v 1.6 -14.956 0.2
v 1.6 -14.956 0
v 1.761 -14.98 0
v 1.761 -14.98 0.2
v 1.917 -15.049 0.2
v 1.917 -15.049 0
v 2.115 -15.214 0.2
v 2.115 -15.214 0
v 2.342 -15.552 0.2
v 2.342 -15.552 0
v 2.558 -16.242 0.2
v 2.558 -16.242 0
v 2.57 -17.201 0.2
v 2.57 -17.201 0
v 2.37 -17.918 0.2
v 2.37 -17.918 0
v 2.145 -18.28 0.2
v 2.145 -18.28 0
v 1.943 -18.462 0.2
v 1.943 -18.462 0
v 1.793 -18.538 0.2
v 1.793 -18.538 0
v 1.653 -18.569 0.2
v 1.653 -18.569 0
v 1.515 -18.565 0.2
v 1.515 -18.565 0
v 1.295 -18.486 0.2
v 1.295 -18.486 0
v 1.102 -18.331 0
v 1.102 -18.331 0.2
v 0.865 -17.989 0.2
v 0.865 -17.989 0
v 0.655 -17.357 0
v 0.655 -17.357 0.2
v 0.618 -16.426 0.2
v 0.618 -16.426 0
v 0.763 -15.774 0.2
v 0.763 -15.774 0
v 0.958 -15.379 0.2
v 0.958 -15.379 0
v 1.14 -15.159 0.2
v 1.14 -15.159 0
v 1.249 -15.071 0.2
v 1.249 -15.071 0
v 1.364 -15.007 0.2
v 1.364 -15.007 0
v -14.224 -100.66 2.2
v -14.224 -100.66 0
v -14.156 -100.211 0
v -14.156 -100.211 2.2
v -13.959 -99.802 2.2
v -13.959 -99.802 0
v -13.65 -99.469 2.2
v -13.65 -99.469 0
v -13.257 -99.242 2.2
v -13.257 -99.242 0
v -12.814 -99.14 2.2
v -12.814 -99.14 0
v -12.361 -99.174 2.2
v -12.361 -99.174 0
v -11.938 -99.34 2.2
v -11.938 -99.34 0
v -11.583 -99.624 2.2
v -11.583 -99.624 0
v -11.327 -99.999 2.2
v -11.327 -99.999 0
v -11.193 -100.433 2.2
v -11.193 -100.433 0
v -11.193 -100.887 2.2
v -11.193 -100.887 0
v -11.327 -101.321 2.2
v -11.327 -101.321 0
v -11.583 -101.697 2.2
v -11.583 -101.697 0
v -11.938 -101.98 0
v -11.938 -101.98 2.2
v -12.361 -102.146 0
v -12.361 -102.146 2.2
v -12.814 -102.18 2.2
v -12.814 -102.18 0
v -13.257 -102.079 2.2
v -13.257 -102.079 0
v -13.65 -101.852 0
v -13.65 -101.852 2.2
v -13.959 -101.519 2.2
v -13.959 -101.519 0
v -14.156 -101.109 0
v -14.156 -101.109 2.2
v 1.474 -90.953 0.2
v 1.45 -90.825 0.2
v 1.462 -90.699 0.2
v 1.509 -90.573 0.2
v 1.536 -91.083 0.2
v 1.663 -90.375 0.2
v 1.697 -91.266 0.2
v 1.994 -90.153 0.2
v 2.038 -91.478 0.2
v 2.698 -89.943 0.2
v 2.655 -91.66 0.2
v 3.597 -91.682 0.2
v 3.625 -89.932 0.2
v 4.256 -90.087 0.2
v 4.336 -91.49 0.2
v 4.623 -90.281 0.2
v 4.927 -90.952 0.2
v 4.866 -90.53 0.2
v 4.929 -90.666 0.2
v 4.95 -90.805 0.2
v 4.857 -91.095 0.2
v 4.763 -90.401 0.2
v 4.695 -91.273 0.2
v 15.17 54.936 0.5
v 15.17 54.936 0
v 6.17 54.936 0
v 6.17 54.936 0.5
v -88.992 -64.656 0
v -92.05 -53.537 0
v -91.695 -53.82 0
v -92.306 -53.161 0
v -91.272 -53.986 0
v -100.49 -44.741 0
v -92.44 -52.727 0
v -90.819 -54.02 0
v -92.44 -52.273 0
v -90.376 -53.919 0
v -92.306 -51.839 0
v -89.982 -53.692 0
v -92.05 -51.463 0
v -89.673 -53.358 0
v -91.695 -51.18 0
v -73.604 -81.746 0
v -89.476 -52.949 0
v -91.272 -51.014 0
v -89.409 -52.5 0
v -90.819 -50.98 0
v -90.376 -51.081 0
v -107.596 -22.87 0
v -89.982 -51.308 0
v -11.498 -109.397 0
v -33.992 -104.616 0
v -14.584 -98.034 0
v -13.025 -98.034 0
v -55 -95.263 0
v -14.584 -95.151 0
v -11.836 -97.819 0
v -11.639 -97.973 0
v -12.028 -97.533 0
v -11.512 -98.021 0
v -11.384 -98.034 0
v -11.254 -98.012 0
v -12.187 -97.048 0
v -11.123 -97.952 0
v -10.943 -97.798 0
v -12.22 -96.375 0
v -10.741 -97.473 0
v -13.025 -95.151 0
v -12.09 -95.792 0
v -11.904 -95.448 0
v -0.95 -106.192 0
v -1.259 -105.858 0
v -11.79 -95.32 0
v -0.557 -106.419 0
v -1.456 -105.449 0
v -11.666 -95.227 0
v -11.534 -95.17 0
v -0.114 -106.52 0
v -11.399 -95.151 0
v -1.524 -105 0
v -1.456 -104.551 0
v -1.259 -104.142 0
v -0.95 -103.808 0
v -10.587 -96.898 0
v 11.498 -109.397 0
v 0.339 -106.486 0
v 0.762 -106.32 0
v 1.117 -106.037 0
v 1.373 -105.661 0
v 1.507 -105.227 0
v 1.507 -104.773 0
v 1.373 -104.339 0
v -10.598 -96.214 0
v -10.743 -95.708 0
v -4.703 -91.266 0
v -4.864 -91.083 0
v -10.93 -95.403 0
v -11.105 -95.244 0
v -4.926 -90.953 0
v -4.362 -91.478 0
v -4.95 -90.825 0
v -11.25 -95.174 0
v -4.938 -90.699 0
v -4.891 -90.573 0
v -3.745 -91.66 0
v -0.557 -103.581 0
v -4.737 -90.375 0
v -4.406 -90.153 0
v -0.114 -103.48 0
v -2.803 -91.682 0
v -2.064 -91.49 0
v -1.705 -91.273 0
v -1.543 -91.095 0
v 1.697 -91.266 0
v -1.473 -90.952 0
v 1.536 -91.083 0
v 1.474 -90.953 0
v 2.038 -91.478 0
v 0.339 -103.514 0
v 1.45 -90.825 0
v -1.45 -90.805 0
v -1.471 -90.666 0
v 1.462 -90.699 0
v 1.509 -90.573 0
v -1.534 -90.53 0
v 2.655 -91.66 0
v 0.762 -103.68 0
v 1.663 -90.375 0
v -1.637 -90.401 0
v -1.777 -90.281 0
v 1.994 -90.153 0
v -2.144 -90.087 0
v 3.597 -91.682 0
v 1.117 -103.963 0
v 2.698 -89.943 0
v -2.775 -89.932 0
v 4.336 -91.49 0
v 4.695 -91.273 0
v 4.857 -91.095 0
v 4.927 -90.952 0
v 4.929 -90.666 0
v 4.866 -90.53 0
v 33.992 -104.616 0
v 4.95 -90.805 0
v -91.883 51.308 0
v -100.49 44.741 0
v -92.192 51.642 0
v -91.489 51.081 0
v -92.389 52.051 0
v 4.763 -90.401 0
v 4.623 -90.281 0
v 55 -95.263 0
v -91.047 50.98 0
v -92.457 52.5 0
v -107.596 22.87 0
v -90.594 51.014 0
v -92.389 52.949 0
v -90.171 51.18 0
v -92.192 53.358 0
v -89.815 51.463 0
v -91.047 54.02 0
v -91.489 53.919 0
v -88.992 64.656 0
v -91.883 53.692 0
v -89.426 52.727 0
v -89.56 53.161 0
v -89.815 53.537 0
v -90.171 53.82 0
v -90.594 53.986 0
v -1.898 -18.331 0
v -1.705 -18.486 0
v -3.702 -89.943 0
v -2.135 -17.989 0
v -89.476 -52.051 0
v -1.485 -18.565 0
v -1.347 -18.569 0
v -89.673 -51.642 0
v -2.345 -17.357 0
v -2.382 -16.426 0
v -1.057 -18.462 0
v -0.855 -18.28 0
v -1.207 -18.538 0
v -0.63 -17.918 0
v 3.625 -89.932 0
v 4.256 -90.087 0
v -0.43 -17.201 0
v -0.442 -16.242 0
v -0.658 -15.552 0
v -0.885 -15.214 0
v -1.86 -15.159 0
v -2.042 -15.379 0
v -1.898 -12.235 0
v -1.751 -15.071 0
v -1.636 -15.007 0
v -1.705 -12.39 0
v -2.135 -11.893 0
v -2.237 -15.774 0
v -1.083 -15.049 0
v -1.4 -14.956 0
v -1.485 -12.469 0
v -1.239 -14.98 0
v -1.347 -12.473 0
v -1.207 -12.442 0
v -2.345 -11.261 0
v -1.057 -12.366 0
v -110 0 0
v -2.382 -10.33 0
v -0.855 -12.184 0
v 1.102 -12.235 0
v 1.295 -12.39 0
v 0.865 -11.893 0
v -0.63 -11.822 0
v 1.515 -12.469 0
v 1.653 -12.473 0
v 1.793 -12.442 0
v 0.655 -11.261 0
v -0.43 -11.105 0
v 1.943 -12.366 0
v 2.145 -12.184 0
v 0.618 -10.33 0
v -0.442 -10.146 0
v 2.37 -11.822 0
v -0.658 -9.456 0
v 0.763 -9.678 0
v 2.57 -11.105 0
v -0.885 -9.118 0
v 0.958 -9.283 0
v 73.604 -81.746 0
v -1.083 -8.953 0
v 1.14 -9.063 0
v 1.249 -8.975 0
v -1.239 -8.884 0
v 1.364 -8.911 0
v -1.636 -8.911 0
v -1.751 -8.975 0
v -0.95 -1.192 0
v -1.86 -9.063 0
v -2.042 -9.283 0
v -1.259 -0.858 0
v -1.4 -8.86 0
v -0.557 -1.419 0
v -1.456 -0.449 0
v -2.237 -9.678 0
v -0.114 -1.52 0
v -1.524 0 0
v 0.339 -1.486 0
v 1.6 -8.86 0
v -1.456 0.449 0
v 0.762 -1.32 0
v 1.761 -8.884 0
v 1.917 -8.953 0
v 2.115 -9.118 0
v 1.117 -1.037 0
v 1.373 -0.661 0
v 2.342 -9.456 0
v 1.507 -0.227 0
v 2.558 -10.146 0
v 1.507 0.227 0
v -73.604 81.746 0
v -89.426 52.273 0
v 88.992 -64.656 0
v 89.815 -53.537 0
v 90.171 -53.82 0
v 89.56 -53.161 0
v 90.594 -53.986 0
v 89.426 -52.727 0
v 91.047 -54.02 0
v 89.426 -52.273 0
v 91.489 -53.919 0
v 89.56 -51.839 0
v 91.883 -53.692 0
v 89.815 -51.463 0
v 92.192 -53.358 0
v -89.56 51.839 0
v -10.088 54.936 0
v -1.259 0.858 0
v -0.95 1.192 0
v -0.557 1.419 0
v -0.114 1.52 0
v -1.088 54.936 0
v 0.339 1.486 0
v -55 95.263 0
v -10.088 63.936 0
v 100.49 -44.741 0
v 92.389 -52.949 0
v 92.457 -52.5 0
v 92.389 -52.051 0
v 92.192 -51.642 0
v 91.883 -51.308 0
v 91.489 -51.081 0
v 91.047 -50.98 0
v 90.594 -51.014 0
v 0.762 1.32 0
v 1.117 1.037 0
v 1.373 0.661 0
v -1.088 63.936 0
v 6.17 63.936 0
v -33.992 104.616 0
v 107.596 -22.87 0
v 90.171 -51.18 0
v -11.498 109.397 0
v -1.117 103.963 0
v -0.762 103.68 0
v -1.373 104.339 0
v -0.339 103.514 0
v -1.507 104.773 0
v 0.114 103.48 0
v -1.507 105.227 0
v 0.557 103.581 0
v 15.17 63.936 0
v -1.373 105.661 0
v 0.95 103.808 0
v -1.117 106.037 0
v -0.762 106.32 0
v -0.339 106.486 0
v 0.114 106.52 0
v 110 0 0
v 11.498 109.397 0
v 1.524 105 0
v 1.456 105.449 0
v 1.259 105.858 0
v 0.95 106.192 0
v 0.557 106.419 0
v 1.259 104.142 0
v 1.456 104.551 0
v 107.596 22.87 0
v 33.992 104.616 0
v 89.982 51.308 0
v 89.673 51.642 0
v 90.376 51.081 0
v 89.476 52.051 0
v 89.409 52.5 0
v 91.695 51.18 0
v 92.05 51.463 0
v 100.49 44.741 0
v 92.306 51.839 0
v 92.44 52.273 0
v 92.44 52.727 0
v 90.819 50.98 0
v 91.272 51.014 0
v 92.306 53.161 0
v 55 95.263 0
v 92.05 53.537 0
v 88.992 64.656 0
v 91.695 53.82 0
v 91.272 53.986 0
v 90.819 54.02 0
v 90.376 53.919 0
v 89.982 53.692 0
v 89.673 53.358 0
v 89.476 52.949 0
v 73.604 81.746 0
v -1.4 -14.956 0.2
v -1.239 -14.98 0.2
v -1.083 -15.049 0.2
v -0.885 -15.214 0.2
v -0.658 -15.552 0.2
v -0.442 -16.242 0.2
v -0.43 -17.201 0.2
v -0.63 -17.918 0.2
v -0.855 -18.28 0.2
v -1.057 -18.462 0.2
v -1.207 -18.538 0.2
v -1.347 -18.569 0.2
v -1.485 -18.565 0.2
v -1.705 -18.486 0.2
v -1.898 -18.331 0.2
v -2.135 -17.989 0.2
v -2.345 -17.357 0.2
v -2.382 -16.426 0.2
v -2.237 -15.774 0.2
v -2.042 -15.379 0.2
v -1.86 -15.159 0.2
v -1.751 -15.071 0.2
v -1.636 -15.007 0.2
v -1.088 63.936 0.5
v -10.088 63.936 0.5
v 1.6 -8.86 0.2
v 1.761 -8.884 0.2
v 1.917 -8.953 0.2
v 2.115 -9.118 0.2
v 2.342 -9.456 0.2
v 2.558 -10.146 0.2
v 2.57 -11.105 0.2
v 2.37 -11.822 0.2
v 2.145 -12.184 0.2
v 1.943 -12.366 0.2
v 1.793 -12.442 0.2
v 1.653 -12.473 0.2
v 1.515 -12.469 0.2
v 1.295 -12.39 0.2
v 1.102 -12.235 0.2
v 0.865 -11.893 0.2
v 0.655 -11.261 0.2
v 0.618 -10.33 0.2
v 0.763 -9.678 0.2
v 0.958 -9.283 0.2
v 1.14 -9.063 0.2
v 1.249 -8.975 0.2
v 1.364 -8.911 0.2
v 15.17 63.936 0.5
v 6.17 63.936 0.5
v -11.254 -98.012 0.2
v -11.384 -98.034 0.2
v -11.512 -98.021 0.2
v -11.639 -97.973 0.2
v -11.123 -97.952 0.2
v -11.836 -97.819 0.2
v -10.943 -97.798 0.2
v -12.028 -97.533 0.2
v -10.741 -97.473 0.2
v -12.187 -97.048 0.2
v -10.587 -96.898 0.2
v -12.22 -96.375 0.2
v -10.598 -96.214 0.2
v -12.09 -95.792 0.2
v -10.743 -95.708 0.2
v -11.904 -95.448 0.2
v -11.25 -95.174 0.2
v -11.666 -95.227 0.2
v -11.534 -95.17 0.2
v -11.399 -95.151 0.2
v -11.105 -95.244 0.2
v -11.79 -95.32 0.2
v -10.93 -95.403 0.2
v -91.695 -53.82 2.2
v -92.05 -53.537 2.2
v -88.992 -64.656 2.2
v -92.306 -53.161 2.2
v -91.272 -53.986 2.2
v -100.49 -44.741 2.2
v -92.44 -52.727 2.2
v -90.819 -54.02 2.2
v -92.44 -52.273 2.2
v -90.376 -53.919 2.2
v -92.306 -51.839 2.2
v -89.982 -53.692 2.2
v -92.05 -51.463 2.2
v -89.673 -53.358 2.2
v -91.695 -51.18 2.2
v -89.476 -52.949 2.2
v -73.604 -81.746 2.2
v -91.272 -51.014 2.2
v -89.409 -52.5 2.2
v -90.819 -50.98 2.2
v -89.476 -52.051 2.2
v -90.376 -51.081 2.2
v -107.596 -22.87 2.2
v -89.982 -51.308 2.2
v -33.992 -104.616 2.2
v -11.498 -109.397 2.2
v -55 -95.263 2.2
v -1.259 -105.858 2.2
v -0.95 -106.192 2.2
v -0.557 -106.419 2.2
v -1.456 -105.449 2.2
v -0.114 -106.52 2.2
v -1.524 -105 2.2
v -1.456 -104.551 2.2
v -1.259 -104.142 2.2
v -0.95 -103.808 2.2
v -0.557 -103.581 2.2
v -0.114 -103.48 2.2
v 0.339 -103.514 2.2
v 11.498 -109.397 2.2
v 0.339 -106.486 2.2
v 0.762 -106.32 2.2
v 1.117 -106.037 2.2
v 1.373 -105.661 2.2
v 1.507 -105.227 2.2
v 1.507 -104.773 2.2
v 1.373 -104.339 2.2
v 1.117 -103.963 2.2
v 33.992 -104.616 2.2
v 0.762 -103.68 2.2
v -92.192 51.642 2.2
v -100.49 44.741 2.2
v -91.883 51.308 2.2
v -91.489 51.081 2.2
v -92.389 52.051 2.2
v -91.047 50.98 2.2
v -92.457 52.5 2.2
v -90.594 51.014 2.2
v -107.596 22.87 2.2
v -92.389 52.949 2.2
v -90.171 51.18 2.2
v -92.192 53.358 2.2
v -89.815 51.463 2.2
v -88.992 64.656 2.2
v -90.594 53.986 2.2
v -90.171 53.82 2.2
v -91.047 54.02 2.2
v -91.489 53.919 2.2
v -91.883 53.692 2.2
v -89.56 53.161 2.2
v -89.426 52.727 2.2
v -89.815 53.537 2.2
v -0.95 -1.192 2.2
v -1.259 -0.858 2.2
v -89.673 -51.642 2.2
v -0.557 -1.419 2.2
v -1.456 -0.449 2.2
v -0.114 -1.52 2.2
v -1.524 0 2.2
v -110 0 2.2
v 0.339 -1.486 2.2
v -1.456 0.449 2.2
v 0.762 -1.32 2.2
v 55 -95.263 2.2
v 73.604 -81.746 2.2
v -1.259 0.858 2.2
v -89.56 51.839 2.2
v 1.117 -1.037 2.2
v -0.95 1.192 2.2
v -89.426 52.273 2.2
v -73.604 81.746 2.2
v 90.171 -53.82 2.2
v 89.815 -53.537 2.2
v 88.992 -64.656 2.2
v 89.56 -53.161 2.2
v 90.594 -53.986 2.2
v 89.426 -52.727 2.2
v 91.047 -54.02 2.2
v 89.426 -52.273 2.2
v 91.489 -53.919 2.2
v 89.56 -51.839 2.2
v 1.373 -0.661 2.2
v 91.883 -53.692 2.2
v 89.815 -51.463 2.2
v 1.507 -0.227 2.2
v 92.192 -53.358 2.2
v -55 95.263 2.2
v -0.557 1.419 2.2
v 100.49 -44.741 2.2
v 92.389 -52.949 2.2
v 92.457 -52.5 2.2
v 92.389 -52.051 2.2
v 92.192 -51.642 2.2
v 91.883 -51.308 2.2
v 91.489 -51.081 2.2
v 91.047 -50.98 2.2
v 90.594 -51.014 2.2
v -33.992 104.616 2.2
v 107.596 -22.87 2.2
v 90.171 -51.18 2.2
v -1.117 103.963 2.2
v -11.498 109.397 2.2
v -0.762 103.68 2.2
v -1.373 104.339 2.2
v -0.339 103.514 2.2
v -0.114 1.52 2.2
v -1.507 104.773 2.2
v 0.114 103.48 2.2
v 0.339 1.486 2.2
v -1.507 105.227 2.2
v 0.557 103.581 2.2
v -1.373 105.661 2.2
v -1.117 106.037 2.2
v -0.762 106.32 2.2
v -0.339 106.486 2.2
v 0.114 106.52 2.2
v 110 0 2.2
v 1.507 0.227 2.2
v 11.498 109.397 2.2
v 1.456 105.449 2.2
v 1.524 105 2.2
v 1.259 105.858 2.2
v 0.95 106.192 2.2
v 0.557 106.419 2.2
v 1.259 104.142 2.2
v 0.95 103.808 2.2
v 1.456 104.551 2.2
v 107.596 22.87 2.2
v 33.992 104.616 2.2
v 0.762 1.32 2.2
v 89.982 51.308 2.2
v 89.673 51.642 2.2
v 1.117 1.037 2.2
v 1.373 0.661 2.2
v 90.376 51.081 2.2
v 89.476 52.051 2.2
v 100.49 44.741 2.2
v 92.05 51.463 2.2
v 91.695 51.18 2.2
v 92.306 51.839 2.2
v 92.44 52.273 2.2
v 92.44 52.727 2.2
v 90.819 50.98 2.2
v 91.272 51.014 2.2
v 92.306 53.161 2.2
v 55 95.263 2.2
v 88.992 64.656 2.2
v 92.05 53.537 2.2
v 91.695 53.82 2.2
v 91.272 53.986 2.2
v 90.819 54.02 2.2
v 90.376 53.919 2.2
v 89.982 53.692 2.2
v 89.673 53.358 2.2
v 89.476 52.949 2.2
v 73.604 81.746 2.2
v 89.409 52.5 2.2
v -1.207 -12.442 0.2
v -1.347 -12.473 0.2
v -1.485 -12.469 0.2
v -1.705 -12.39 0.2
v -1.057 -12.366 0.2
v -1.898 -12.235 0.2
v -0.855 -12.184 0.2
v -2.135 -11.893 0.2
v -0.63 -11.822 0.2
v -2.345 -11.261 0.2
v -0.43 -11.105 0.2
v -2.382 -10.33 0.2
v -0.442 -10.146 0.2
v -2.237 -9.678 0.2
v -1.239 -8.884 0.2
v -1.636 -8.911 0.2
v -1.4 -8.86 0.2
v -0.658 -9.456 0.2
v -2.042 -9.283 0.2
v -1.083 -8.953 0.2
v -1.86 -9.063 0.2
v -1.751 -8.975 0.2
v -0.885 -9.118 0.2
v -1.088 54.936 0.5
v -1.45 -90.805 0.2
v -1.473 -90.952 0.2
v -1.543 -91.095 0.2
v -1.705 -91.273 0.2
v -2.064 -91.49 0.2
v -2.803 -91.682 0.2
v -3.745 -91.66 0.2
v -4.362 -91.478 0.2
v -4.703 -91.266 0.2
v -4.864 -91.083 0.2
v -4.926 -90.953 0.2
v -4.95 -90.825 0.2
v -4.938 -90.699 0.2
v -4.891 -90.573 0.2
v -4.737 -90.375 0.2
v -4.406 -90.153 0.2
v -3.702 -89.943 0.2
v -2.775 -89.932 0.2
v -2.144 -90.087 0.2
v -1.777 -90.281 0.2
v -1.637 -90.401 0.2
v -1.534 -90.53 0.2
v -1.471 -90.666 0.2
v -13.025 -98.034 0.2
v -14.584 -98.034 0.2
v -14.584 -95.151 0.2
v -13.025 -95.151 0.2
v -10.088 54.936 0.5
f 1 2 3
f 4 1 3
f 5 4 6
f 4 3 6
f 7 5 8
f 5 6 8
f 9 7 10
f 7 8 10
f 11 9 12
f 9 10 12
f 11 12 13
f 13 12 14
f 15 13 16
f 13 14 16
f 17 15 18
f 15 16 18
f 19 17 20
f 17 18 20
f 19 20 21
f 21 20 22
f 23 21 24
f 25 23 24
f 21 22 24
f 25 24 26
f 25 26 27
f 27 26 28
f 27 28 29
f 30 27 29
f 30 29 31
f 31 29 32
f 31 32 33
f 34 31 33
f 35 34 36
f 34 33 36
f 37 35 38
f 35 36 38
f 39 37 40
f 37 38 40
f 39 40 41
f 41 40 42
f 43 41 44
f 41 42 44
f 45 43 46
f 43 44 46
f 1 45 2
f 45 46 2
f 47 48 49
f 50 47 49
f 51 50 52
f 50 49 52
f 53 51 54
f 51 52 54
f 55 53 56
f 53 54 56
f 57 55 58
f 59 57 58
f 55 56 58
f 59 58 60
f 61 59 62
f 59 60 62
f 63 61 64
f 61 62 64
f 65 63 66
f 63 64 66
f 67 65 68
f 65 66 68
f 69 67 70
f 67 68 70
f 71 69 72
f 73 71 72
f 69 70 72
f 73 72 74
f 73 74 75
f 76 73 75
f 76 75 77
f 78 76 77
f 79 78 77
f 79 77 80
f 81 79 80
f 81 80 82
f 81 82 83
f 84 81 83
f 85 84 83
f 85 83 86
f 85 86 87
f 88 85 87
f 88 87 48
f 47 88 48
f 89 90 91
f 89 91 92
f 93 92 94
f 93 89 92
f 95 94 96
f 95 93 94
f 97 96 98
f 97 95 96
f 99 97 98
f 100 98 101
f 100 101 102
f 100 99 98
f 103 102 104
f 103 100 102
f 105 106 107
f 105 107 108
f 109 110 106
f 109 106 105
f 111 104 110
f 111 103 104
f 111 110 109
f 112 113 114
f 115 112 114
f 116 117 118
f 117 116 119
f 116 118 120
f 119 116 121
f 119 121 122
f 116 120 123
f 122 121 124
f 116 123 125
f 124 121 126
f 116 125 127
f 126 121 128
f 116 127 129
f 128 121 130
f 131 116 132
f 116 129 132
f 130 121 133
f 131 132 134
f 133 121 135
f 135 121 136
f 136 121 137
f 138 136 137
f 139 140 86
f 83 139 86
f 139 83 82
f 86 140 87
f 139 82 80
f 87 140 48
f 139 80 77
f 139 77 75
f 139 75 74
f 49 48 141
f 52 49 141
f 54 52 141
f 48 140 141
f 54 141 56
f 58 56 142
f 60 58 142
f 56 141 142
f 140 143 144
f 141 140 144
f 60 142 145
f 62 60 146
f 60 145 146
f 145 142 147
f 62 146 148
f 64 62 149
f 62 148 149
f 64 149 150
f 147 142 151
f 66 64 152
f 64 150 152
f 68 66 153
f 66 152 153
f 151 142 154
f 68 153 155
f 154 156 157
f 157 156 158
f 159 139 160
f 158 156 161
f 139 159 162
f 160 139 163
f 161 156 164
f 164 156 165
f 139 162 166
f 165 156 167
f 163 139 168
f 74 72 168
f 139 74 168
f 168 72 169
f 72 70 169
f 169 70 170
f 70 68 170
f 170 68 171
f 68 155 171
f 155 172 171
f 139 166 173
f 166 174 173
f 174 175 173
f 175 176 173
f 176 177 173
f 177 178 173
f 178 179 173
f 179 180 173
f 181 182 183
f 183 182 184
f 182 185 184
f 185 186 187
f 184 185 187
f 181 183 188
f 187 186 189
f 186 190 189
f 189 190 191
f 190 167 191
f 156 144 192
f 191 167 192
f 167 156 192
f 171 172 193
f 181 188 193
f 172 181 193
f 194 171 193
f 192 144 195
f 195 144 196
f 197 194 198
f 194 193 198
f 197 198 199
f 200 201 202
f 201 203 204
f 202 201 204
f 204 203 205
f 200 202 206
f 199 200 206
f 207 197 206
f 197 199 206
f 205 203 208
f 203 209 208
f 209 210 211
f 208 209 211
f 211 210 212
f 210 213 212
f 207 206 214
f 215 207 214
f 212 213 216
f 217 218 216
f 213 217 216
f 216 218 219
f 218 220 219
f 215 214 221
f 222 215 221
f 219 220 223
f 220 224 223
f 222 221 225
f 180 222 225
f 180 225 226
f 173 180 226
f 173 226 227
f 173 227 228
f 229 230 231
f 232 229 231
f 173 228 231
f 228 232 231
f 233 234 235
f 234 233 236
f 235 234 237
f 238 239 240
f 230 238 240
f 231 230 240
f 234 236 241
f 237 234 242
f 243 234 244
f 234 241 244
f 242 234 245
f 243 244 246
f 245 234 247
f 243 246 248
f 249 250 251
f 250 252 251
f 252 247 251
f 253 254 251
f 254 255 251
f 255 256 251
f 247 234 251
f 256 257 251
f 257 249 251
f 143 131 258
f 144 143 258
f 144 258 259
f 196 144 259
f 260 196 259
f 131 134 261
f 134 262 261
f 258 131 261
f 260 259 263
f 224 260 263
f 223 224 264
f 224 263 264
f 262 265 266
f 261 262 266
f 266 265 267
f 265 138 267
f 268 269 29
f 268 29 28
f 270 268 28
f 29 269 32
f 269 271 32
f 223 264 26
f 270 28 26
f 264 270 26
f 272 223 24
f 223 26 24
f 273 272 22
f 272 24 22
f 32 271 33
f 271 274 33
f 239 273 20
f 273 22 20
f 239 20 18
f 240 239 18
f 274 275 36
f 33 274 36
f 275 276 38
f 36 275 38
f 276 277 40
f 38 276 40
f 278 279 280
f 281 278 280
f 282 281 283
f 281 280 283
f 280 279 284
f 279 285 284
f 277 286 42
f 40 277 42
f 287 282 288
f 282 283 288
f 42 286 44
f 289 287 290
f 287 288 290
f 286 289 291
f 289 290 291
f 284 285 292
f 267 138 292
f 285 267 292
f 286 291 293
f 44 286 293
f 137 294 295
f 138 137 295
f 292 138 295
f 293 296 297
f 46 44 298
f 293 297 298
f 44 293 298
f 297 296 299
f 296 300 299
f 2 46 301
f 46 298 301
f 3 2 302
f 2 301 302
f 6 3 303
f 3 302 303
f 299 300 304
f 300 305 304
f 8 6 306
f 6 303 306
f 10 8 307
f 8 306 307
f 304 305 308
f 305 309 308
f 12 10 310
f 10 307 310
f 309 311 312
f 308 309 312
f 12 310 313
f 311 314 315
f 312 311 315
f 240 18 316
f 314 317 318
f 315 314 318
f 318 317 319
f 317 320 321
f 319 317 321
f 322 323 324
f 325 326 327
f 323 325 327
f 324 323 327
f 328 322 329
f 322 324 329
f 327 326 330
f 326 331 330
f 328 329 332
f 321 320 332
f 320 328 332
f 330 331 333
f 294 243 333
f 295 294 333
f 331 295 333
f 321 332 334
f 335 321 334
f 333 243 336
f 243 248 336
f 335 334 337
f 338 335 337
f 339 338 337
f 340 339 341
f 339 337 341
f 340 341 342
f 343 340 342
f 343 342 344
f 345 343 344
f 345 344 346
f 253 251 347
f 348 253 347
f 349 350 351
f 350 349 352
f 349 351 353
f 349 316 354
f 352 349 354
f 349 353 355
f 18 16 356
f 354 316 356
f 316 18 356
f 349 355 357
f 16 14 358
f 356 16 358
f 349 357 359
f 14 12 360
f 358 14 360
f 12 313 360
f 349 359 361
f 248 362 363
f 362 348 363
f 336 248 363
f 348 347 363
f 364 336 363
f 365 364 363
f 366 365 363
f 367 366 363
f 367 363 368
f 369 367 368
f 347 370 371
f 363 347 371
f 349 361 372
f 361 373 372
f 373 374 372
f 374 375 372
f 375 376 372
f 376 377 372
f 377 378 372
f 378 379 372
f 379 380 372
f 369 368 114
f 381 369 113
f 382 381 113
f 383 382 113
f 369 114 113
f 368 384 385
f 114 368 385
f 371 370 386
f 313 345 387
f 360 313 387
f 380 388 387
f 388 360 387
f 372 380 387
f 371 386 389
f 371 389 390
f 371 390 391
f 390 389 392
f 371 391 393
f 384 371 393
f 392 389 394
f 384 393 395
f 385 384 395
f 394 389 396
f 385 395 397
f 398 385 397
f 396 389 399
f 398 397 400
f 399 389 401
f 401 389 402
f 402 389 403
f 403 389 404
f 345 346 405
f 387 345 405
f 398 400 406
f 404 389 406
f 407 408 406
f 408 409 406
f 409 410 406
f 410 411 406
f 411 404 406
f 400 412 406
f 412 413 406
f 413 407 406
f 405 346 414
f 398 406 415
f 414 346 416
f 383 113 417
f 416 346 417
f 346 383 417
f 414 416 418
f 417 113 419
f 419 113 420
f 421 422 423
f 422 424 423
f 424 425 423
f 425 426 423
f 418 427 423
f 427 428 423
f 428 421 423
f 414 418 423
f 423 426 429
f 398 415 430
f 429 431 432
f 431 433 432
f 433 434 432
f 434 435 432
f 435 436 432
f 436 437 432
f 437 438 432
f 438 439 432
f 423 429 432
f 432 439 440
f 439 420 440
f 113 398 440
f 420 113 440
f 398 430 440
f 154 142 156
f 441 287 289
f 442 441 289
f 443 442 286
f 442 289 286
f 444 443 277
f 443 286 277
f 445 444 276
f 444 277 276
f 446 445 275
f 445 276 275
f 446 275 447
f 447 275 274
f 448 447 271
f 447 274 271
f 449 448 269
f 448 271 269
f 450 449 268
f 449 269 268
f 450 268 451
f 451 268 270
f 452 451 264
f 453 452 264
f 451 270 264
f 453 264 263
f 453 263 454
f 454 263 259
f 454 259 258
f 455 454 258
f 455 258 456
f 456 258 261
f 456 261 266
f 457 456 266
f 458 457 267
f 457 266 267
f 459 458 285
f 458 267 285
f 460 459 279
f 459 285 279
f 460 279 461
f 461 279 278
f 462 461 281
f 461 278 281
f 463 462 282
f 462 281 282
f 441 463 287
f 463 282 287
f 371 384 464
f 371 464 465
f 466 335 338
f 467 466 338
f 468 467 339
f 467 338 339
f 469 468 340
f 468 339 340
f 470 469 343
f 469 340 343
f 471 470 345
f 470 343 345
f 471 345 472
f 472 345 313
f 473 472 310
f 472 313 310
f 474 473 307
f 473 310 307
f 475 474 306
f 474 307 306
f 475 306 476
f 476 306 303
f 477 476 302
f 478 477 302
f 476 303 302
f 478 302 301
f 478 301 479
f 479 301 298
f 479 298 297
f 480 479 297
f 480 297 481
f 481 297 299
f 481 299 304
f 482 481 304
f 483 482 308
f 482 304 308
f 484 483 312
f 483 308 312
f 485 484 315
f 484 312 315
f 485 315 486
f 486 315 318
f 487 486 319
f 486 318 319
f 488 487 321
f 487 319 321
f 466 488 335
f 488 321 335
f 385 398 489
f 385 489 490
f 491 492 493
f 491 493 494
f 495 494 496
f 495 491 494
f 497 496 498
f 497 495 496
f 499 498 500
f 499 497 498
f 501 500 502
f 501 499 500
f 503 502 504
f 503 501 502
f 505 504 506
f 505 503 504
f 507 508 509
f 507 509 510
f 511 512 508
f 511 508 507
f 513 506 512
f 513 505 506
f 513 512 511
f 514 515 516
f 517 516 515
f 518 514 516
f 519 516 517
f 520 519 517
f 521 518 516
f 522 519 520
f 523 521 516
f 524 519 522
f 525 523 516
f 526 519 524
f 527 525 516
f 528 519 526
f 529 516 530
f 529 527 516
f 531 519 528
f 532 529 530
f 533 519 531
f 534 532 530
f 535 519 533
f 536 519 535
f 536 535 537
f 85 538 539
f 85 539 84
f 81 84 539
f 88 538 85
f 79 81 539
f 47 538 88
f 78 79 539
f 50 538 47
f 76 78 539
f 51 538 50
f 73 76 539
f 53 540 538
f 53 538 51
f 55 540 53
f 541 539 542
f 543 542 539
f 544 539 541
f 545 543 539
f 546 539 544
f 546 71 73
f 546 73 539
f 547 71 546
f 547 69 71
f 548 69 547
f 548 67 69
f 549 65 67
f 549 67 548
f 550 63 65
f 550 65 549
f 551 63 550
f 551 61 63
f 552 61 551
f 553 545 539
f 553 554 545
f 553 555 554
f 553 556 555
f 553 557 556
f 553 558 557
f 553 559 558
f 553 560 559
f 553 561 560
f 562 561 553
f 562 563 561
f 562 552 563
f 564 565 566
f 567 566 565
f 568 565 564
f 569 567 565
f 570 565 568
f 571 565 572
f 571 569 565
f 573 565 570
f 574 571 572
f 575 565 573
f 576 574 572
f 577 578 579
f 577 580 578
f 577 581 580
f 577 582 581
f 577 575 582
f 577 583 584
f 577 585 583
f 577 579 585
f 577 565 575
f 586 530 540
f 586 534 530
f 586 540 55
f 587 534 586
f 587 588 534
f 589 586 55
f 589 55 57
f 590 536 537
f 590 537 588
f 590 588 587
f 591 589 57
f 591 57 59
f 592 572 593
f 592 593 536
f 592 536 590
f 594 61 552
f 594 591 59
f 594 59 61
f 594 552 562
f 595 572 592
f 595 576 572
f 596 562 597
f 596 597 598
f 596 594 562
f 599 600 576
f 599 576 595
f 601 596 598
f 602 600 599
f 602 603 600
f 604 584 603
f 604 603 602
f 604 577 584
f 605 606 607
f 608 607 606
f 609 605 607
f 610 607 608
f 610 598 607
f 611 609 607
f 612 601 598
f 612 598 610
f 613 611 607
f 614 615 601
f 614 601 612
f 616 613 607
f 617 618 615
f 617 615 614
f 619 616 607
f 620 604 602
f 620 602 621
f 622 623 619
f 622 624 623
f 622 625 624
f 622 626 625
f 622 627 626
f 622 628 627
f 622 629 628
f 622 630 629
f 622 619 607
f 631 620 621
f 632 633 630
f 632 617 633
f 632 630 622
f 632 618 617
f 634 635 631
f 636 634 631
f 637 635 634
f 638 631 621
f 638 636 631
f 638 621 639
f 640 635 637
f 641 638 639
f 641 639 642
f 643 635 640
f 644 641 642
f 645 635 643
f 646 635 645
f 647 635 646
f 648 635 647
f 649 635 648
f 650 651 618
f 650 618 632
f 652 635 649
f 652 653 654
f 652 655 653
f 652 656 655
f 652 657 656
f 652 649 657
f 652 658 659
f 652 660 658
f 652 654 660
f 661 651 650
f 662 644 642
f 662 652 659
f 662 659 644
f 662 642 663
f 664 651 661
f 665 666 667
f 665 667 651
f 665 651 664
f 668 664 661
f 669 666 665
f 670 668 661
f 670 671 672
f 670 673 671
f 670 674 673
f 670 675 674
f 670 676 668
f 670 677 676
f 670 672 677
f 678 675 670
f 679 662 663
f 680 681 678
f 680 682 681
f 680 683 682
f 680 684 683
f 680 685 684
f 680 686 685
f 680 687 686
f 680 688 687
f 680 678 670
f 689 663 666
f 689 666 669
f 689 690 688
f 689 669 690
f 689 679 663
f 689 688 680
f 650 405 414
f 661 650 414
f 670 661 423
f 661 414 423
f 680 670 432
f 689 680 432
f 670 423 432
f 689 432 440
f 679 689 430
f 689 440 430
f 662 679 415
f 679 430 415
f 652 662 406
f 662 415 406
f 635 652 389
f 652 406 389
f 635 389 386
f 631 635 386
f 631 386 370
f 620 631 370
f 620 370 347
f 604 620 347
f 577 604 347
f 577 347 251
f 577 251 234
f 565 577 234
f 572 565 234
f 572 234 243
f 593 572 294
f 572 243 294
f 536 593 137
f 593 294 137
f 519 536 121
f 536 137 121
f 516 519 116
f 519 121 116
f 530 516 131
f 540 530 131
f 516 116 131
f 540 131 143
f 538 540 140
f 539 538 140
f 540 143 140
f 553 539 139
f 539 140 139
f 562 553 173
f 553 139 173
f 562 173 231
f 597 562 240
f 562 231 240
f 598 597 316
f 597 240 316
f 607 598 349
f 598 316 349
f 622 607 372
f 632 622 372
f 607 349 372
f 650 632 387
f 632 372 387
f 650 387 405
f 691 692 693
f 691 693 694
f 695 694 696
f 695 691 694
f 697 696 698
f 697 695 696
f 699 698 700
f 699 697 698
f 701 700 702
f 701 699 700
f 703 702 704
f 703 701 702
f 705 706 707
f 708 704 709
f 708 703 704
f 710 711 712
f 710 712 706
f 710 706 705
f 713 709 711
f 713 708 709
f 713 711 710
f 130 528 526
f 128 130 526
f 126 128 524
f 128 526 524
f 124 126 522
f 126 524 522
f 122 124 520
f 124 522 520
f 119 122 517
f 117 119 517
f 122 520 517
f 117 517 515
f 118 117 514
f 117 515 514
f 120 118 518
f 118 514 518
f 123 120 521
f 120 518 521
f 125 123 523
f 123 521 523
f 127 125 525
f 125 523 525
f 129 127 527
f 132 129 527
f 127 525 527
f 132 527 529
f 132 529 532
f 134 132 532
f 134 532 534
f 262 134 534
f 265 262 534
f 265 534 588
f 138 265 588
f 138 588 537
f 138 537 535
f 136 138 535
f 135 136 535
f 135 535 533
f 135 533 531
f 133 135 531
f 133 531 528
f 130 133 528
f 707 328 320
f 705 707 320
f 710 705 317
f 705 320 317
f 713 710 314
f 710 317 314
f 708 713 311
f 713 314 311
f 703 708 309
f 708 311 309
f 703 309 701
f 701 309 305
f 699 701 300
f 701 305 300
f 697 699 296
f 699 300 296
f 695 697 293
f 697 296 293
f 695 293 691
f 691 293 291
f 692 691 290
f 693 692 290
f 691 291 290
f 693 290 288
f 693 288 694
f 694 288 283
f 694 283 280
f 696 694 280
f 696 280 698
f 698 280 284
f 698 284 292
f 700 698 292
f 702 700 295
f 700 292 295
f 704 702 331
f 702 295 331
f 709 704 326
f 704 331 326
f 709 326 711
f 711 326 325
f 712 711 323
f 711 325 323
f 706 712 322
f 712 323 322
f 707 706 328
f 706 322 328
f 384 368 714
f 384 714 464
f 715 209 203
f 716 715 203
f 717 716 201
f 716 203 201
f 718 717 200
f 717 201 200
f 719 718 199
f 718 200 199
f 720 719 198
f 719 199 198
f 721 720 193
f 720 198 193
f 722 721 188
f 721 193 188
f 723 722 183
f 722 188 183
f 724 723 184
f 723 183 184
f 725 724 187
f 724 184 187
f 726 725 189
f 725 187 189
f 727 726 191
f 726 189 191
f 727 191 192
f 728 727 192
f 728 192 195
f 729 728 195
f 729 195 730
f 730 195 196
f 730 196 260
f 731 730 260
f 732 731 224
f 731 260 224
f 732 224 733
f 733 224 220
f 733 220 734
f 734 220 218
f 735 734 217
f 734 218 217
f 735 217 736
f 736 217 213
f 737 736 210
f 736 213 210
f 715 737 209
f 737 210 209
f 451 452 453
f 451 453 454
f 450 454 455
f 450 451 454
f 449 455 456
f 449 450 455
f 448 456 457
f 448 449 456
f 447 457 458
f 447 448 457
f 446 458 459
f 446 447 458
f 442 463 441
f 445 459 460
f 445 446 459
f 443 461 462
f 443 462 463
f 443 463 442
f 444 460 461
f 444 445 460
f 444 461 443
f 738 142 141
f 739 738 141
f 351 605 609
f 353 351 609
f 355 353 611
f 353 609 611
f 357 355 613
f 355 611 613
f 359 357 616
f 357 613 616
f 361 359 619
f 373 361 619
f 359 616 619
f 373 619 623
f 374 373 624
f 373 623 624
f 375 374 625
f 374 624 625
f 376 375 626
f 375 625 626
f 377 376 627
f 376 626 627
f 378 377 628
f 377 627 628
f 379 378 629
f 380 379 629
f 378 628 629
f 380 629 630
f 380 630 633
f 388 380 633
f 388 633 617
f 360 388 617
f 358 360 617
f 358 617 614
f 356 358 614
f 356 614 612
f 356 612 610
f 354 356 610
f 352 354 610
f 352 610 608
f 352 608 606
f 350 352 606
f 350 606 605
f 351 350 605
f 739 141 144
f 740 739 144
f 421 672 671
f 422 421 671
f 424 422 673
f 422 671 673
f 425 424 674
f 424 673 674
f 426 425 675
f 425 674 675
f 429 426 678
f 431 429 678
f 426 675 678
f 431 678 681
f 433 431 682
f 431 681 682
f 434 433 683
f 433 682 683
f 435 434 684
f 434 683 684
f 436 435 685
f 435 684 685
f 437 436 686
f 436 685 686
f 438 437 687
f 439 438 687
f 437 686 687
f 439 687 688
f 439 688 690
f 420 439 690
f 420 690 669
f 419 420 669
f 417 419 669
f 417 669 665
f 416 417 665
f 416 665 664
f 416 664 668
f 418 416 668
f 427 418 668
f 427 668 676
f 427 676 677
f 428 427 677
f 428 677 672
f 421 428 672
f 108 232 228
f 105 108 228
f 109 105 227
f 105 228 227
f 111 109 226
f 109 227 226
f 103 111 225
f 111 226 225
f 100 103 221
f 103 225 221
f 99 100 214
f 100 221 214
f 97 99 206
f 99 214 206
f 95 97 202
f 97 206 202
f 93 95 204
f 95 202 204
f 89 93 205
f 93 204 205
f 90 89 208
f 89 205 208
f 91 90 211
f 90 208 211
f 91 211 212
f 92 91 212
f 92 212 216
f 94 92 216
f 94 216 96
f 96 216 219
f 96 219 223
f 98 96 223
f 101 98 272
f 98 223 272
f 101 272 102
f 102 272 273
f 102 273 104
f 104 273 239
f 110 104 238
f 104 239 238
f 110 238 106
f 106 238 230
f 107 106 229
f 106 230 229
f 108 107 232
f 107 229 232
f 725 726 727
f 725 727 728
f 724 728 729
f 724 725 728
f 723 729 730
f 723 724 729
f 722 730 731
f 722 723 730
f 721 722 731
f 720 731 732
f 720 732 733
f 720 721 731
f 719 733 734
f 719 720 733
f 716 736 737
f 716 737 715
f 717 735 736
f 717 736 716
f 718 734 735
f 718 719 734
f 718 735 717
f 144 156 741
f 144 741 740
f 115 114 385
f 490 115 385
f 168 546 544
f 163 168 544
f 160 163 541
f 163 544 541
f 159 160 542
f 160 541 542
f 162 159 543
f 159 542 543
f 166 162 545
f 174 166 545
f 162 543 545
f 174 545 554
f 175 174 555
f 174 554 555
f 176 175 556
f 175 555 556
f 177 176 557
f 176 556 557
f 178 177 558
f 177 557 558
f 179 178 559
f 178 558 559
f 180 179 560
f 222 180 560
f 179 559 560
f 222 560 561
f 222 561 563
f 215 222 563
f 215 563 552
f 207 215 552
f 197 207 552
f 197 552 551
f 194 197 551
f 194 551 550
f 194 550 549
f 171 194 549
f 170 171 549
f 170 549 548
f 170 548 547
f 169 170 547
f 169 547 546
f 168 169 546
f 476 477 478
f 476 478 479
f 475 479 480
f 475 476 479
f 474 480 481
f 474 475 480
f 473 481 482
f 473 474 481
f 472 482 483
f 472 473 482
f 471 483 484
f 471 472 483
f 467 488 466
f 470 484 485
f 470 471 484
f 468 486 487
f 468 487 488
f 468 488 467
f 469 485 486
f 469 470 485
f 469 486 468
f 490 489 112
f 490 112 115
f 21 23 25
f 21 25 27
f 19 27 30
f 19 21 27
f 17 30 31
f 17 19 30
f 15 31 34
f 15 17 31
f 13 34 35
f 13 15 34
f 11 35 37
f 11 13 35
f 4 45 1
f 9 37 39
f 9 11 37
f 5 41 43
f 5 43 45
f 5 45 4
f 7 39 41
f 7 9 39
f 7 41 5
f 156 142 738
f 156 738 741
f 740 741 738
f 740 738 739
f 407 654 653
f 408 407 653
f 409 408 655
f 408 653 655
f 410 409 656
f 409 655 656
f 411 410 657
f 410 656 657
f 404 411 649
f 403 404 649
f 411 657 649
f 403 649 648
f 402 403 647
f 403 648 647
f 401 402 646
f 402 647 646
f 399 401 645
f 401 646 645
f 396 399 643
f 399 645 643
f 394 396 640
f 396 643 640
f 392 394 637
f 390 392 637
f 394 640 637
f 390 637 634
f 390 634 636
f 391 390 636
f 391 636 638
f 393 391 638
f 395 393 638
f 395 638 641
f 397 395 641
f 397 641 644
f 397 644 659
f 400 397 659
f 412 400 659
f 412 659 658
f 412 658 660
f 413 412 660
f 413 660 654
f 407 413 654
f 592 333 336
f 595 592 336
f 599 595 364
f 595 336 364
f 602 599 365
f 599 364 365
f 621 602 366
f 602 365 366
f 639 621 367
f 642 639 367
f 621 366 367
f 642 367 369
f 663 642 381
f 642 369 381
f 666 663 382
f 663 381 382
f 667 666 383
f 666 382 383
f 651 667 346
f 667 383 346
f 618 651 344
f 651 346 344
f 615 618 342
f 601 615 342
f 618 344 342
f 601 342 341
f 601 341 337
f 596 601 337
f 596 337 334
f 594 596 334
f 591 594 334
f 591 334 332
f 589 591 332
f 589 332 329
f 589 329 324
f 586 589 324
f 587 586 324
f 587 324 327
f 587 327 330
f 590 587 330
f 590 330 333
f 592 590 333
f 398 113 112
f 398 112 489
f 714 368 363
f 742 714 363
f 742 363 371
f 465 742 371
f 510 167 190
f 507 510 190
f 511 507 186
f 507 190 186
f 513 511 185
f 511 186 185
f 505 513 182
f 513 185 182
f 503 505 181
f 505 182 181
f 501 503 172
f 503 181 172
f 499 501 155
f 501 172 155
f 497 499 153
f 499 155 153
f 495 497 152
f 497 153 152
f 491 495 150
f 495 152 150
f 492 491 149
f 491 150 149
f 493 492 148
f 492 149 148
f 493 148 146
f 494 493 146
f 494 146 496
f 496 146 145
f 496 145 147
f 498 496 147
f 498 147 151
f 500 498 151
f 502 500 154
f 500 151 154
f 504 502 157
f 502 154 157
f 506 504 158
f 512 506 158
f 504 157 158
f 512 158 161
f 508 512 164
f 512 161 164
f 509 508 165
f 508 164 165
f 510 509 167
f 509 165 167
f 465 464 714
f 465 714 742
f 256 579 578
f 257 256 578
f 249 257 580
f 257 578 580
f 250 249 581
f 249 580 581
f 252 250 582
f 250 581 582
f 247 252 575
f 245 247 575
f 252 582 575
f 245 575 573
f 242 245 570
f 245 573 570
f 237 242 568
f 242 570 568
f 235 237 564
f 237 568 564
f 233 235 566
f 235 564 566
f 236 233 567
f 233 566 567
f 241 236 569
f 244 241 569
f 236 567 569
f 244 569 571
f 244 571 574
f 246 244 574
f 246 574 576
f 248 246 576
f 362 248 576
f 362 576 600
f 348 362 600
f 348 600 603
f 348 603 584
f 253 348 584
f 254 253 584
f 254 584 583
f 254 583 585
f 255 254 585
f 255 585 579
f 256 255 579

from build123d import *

# Parameters (mm, degrees)
SKETCH1_R            = 110
BOSS_EXTRUDE1_DEPTH  = 2.2
SKETCH2_R            = 1.524
CUT_EXTRUDE1_DEPTH   = 156.579047432
CIRPATTERN1_COUNT    = 6
SKETCH3_W            = 9
SKETCH3_H            = 9
CUT_EXTRUDE2_DEPTH   = 0.5
SKETCH12_RX          = 1.807909399
SKETCH12_RY          = 1
CUT_EXTRUDE5_DEPTH   = 0.2
LPATTERN1_COUNT      = 2
LPATTERN1_PITCH      = 3
LPATTERN1_COUNT_DIR2 = 2
LPATTERN1_PITCH_DIR2 = 6.096
SKETCH13_R           = 1.524
CUT_EXTRUDE6_DEPTH   = 156.579047432
SKETCH14_RX          = 1.75
SKETCH14_RY          = 0.9
CUT_EXTRUDE7_DEPTH   = 0.2
LPATTERN2_COUNT      = 2
LPATTERN2_PITCH      = 6.4
SKETCH15_RX          = 1.441806236
SKETCH15_RY          = 0.830559885
SKETCH15_W           = 1.559100293
SKETCH15_H           = 2.883612472
CUT_EXTRUDE8_DEPTH   = 0.2


with BuildPart() as part:
    # Sketch1 → Boss-Extrude1 (new body)
    with BuildSketch(Plane.XY):
        Circle(SKETCH1_R)
    extrude(amount=BOSS_EXTRUDE1_DEPTH)

    # Sketch2 → Cut-Extrude1 (cut, through all)
    with BuildSketch(Plane.XY.offset(2.2)):
        with Locations((0, 105)):
            Circle(SKETCH2_R)
    cut_extrude1 = extrude(amount=-CUT_EXTRUDE1_DEPTH, mode=Mode.SUBTRACT)

    # CirPattern1: Cut-Extrude1 ×6 about axis
    cirpattern1_axis = Axis((0, 0, 2.2), (0, 0, 1))
    for i in range(1, CIRPATTERN1_COUNT):
        add(cut_extrude1.rotate(cirpattern1_axis, i * 360 / CIRPATTERN1_COUNT), mode=Mode.SUBTRACT)

    # Sketch3 → Cut-Extrude2 (cut)
    with BuildSketch(Plane(origin=(0, 0, 0), x_dir=(-1, 0, 0), z_dir=(0, 0, -1))):
        with Locations((-10.67, 59.436)):
            Rectangle(SKETCH3_W, SKETCH3_H)
        with Locations((5.588, 59.436)):
            Rectangle(SKETCH3_W, SKETCH3_H)
    extrude(amount=-CUT_EXTRUDE2_DEPTH, mode=Mode.SUBTRACT)

    # Sketch12 → Cut-Extrude5 (cut)
    with BuildSketch(Plane(origin=(0, 0, 0), x_dir=(-1, 0, 0), z_dir=(0, 0, -1))):
        with Locations(Location((-1.6002, -10.668), (0, 0, 90))):
            Ellipse(SKETCH12_RX, SKETCH12_RY)
    cut_extrude5 = extrude(amount=-CUT_EXTRUDE5_DEPTH, mode=Mode.SUBTRACT)

    # LPattern1: Cut-Extrude5 2 × 2
    with Locations(*[(-i * LPATTERN1_PITCH, -j * LPATTERN1_PITCH_DIR2, 0) for i in range(LPATTERN1_COUNT) for j in range(LPATTERN1_COUNT_DIR2) if (i, j) != (0, 0)]):
        add(cut_extrude5, mode=Mode.SUBTRACT)

    # Sketch13 → Cut-Extrude6 (cut, through all)
    with BuildSketch(Plane(origin=(0, 0, 0), x_dir=(-1, 0, 0), z_dir=(0, 0, -1))):
        Circle(SKETCH13_R)
        with Locations((12.7, -100.6602)):
            Circle(SKETCH13_R)
    extrude(amount=-CUT_EXTRUDE6_DEPTH, mode=Mode.SUBTRACT)

    # Sketch14 → Cut-Extrude7 (cut)
    with BuildSketch(Plane(origin=(0, 0, 0), x_dir=(-1, 0, 0), z_dir=(0, 0, -1))):
        with Locations(Location((-3.2, -90.805), (0, 0, 180))):
            Ellipse(SKETCH14_RX, SKETCH14_RY)
    cut_extrude7 = extrude(amount=-CUT_EXTRUDE7_DEPTH, mode=Mode.SUBTRACT)

    # LPattern2: Cut-Extrude7 ×2
    with Locations(*[(-i * LPATTERN2_PITCH, 0, 0) for i in range(1, LPATTERN2_COUNT)]):
        add(cut_extrude7, mode=Mode.SUBTRACT)

    # Sketch15 → Cut-Extrude8 (cut)
    with BuildSketch(Plane(origin=(0, 0, 0), x_dir=(-1, 0, 0), z_dir=(0, 0, -1))):
        with Locations(Location((11.398915538, -96.592408929), (0, 0, 90))):
            Ellipse(SKETCH15_RX, SKETCH15_RY)
        with Locations((13.804777386, -96.592408929)):
            Rectangle(SKETCH15_W, SKETCH15_H)
    extrude(amount=-CUT_EXTRUDE8_DEPTH, mode=Mode.SUBTRACT)


solid = part.part
